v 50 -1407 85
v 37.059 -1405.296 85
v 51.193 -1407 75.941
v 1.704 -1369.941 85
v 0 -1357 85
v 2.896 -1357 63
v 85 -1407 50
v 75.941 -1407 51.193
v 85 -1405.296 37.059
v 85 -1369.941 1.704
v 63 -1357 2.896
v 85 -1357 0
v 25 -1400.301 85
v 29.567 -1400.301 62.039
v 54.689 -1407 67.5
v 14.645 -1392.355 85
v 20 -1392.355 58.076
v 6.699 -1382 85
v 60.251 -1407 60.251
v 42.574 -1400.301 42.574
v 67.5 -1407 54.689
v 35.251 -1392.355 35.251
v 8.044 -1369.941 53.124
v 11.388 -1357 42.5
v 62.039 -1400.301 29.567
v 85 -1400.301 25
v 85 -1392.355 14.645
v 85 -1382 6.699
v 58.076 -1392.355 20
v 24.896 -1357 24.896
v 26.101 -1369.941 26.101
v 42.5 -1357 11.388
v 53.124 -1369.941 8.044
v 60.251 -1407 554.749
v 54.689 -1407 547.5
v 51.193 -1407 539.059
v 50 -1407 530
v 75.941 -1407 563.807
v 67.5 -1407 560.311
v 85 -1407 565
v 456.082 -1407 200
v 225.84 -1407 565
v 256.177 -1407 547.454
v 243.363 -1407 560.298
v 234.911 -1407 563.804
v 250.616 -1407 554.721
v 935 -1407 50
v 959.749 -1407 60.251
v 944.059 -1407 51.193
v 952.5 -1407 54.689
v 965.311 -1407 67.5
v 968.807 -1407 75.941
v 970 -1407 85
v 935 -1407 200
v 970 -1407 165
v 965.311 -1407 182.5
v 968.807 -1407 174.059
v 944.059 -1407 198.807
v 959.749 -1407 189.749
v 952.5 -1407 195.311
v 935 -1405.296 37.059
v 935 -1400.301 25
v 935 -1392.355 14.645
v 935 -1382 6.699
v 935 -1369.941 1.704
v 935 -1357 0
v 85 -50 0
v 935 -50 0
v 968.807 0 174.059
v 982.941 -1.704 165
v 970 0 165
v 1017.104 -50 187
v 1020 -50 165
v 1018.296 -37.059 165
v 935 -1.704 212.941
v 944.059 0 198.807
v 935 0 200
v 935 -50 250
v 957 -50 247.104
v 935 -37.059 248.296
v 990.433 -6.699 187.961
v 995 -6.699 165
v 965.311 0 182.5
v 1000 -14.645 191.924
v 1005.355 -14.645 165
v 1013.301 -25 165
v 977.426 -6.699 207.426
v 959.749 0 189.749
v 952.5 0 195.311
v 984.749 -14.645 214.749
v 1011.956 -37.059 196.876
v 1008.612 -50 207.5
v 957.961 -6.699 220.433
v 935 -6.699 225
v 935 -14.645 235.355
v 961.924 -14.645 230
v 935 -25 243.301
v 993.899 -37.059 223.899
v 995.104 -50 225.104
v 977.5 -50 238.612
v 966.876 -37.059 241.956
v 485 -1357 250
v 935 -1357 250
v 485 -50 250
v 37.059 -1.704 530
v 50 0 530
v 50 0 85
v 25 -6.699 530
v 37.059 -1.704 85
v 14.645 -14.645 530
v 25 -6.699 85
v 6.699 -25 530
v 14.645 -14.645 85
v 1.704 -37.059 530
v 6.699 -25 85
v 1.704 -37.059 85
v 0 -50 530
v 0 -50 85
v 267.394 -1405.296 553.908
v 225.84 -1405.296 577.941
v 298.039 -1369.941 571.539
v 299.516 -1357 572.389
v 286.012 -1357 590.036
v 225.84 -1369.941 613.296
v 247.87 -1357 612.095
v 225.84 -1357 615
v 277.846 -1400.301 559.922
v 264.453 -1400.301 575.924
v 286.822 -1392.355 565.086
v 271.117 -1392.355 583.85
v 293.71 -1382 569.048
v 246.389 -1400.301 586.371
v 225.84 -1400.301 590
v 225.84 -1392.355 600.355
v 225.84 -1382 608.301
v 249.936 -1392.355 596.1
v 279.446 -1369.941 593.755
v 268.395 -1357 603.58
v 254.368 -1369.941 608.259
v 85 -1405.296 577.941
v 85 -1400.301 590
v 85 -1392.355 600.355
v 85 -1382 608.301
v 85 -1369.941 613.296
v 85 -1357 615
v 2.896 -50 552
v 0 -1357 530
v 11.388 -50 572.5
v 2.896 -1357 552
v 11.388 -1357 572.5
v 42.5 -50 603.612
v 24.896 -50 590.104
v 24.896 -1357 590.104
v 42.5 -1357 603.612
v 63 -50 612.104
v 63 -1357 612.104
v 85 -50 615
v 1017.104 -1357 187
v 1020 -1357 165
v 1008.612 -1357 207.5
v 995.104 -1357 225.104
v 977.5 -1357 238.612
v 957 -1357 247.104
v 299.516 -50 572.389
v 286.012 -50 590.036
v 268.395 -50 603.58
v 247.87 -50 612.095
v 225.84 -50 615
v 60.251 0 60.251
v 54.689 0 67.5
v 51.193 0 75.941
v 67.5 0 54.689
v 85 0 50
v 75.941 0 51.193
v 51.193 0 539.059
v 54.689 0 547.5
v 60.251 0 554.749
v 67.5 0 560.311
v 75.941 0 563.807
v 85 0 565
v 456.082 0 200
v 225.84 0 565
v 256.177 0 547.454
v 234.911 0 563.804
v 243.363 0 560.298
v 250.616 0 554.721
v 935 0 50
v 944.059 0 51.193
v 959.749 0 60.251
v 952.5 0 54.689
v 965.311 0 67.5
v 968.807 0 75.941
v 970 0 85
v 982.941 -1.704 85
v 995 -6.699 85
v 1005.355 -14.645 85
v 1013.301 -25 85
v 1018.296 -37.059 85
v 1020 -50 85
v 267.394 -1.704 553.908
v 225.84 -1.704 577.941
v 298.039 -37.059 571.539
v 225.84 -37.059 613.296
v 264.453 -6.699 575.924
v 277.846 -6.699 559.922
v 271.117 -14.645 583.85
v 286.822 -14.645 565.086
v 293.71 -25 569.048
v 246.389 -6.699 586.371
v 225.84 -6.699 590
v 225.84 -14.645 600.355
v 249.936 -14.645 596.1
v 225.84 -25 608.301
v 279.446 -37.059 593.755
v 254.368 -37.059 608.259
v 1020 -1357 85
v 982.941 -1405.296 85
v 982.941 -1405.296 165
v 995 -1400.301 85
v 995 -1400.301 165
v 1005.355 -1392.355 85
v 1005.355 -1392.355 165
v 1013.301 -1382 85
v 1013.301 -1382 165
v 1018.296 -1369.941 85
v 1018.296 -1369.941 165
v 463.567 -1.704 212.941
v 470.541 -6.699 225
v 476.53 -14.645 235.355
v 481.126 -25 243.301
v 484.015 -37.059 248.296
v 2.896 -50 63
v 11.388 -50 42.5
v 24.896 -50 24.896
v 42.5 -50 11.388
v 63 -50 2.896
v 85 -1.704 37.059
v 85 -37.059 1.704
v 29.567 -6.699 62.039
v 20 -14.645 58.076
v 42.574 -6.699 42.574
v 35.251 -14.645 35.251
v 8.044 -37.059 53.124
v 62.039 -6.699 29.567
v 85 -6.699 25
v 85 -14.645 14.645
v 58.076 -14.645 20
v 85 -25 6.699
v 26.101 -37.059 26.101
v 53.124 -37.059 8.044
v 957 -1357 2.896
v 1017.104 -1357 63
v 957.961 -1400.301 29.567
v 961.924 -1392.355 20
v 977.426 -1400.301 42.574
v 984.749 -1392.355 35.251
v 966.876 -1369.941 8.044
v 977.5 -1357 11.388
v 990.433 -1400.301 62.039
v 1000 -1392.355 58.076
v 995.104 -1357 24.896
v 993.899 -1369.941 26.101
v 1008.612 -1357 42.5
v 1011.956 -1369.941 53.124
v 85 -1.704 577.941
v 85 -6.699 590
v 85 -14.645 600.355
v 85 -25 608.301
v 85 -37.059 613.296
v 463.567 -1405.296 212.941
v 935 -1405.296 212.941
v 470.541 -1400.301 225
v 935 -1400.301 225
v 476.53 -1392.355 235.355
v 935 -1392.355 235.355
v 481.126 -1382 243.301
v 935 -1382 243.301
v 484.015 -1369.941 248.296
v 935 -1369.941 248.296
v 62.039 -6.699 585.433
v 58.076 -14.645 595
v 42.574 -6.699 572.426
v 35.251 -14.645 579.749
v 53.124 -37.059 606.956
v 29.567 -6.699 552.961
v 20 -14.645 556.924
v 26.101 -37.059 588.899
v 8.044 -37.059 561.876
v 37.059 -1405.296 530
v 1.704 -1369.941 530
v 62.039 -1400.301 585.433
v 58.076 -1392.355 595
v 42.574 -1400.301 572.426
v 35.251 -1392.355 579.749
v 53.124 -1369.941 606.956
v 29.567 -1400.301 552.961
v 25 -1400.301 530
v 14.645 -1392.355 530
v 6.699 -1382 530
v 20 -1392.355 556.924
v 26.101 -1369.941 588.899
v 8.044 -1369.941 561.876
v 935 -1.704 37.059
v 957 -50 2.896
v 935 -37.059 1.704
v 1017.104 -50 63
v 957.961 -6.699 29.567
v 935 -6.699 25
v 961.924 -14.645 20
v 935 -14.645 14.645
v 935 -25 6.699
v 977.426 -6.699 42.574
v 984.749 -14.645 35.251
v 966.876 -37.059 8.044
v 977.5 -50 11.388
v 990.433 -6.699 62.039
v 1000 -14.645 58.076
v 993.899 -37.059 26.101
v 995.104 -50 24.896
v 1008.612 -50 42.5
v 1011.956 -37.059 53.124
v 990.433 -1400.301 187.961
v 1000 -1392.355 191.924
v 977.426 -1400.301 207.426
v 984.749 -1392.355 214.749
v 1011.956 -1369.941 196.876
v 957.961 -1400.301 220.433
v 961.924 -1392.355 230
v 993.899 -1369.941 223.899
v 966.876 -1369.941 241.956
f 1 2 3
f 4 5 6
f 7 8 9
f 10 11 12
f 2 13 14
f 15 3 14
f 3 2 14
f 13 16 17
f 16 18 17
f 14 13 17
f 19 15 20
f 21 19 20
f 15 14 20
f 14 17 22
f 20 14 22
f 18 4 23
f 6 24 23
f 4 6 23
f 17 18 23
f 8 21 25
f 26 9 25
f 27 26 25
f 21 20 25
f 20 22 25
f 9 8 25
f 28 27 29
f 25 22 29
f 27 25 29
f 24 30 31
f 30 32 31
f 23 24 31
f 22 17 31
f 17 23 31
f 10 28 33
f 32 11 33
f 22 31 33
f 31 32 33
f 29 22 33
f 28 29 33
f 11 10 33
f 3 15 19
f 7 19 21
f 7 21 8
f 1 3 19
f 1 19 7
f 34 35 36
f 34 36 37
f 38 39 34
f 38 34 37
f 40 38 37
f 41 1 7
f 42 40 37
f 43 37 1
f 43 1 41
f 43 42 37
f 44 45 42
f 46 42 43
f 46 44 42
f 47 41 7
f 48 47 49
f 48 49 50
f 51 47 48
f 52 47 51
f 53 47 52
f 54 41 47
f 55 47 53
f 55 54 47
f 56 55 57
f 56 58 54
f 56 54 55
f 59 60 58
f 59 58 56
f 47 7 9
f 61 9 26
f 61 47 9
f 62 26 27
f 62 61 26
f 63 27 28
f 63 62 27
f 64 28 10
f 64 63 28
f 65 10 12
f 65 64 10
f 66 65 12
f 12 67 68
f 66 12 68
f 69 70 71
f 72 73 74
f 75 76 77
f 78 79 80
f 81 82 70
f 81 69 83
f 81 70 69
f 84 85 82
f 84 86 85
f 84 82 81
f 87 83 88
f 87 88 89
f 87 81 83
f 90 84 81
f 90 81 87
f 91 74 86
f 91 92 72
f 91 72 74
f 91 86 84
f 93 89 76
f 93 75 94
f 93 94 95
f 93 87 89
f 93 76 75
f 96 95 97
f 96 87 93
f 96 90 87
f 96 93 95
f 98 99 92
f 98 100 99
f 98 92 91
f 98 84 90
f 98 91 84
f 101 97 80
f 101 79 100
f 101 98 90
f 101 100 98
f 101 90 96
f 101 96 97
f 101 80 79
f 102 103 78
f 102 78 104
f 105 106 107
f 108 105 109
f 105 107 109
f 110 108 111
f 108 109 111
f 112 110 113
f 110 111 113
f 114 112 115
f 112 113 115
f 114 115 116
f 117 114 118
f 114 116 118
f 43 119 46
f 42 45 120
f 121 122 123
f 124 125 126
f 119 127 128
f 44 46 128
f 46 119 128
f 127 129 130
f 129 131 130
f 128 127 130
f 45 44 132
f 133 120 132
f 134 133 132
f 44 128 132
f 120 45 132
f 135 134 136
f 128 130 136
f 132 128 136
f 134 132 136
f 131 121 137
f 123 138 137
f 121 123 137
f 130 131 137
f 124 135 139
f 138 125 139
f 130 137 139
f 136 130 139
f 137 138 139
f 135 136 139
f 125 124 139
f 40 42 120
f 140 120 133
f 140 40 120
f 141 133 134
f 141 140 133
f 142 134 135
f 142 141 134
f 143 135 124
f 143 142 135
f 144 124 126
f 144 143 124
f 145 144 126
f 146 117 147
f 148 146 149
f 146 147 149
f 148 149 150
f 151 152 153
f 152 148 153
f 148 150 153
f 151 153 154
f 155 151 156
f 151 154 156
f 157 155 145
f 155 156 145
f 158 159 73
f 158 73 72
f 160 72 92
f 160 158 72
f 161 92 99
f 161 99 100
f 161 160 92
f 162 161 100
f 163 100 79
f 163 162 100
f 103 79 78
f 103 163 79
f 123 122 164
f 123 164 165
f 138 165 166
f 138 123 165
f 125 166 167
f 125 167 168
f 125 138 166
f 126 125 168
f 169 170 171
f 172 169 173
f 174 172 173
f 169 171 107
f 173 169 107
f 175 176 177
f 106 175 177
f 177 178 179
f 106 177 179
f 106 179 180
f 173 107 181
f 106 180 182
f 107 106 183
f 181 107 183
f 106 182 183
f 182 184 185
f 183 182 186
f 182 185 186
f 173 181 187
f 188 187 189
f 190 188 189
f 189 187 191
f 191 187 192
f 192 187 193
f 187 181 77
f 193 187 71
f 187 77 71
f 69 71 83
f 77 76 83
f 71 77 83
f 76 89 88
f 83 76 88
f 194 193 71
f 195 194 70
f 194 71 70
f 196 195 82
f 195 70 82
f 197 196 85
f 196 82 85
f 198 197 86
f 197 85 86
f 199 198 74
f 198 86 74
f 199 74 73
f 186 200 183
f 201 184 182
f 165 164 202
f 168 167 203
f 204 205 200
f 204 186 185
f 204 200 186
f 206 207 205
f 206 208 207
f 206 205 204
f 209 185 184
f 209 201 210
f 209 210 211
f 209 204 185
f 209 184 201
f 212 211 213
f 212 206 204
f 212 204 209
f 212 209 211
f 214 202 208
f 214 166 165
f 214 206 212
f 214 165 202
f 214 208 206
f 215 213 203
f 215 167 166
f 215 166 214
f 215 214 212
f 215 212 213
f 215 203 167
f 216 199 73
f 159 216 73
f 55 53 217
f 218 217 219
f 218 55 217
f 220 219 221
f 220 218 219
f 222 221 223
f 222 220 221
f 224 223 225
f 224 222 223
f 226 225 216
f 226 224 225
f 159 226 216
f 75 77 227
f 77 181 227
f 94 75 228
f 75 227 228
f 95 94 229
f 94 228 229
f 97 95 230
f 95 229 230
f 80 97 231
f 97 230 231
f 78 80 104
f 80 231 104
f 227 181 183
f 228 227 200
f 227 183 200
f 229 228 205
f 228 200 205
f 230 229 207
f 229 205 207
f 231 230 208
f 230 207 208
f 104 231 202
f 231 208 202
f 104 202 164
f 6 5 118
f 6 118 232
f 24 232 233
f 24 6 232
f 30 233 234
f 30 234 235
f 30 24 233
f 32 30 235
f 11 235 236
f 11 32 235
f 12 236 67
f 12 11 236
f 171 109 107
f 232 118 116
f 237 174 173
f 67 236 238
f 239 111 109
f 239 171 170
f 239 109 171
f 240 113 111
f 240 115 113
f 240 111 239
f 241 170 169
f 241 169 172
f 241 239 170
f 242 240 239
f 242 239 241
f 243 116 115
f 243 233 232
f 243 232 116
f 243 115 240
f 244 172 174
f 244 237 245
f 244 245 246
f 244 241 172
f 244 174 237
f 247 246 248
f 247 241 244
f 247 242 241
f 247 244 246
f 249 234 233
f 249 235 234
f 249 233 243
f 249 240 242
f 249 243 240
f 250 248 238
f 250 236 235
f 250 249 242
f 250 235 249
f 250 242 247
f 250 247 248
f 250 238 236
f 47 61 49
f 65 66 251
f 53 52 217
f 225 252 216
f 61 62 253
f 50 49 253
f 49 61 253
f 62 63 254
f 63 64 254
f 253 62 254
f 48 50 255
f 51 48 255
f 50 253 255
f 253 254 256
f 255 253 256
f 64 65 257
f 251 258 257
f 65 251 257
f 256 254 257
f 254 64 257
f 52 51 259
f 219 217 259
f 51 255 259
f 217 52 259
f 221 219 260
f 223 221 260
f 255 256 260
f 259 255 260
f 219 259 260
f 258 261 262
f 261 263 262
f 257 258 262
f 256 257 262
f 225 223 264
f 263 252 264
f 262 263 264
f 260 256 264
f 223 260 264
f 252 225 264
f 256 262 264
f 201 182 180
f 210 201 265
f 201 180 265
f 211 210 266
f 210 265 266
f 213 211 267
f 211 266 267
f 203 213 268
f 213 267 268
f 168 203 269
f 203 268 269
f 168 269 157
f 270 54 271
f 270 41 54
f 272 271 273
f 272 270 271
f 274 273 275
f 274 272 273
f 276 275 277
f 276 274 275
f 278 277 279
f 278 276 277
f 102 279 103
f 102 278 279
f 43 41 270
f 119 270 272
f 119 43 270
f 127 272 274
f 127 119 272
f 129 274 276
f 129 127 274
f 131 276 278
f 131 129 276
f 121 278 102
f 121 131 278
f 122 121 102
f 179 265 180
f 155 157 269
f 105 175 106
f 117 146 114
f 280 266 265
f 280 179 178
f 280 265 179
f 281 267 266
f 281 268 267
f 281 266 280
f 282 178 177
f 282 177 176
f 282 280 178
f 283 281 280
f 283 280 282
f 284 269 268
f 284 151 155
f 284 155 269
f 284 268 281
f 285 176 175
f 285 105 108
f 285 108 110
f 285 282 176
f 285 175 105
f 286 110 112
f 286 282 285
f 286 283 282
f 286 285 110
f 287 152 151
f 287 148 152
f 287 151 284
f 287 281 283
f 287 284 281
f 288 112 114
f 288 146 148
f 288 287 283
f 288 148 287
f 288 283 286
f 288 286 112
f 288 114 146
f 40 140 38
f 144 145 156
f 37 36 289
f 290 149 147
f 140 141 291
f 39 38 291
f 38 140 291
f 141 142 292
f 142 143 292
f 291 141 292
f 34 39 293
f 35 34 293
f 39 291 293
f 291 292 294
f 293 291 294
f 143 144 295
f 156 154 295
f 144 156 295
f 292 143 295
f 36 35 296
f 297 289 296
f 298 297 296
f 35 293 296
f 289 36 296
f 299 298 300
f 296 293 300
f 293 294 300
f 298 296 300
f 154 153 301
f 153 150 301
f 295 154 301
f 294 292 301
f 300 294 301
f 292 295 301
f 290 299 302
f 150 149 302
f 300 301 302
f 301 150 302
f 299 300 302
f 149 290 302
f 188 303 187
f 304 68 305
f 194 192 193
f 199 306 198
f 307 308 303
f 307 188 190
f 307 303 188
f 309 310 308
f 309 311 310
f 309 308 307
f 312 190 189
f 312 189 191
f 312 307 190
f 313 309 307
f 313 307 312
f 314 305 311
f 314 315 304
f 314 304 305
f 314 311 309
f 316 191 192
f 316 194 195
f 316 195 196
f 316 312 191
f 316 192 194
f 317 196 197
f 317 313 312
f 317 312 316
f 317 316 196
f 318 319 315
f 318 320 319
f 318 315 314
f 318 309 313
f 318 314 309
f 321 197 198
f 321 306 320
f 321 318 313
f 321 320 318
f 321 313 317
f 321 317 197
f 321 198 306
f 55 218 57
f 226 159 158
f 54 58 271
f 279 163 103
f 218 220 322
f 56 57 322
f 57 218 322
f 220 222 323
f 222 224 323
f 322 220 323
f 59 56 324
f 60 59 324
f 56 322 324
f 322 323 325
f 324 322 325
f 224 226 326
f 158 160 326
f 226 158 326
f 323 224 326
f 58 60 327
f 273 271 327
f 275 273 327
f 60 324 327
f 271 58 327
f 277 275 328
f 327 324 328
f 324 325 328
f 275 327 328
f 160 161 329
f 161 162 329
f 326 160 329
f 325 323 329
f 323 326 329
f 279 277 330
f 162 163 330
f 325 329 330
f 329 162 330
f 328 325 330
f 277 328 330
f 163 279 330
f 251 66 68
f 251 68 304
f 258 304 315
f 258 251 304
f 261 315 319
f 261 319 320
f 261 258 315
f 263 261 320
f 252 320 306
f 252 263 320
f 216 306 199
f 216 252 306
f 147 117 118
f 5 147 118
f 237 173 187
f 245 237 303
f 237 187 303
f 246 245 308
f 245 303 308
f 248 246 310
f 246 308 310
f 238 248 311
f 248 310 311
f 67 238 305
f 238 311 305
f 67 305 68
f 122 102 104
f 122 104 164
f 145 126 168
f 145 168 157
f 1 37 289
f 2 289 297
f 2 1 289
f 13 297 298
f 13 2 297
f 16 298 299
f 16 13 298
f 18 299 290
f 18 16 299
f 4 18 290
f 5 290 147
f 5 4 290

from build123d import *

# Parameters (mm, degrees)
F1_DEPTH = 1407
F2_R     = 85
F3_R     = 50


with BuildPart() as f1:
    # F0 (on Front) → F1 (new body)
    with BuildSketch(Plane.XZ):
        Polygon((0, 615), (0, 0), (1020, 0), (1020, 250), (485, 250), (275, 615), align=None)
    extrude(amount=F1_DEPTH)

    # F2
    f2_edges = [f1.edges().sort_by_distance(p)[0] for p in [
        (275, -703.5, 615),
        (1020, -703.5, 250),
        (1020, -703.5, 0),
        (0, -703.5, 0),
        (0, -703.5, 615),
    ]]
    fillet(f2_edges, radius=F2_R)

    # F3
    f3_edges = [f1.edges().sort_by_distance(p)[0] for p in [
        (392.257957, 0, 411.194503),
        (155.419892, 0, 615),
        (268.395245, 0, 603.580111),
        (710, 0, 250),
        (995.104076, 0, 225.104076),
        (1020, 0, 125),
        (995.104076, 0, 24.895924),
        (24.895924, 0, 590.104076),
        (0, 0, 307.5),
        (24.895924, 0, 24.895924),
        (510, 0, 0),
        (710, -1407, 250),
        (392.257957, -1407, 411.194503),
        (268.395245, -1407, 603.580111),
        (155.419892, -1407, 615),
        (24.895924, -1407, 590.104076),
        (0, -1407, 307.5),
        (24.895924, -1407, 24.895924),
        (510, -1407, 0),
        (995.104076, -1407, 24.895924),
        (1020, -1407, 125),
        (995.104076, -1407, 225.104076),
    ]]
    fillet(f3_edges, radius=F3_R)


solid = f1.part
